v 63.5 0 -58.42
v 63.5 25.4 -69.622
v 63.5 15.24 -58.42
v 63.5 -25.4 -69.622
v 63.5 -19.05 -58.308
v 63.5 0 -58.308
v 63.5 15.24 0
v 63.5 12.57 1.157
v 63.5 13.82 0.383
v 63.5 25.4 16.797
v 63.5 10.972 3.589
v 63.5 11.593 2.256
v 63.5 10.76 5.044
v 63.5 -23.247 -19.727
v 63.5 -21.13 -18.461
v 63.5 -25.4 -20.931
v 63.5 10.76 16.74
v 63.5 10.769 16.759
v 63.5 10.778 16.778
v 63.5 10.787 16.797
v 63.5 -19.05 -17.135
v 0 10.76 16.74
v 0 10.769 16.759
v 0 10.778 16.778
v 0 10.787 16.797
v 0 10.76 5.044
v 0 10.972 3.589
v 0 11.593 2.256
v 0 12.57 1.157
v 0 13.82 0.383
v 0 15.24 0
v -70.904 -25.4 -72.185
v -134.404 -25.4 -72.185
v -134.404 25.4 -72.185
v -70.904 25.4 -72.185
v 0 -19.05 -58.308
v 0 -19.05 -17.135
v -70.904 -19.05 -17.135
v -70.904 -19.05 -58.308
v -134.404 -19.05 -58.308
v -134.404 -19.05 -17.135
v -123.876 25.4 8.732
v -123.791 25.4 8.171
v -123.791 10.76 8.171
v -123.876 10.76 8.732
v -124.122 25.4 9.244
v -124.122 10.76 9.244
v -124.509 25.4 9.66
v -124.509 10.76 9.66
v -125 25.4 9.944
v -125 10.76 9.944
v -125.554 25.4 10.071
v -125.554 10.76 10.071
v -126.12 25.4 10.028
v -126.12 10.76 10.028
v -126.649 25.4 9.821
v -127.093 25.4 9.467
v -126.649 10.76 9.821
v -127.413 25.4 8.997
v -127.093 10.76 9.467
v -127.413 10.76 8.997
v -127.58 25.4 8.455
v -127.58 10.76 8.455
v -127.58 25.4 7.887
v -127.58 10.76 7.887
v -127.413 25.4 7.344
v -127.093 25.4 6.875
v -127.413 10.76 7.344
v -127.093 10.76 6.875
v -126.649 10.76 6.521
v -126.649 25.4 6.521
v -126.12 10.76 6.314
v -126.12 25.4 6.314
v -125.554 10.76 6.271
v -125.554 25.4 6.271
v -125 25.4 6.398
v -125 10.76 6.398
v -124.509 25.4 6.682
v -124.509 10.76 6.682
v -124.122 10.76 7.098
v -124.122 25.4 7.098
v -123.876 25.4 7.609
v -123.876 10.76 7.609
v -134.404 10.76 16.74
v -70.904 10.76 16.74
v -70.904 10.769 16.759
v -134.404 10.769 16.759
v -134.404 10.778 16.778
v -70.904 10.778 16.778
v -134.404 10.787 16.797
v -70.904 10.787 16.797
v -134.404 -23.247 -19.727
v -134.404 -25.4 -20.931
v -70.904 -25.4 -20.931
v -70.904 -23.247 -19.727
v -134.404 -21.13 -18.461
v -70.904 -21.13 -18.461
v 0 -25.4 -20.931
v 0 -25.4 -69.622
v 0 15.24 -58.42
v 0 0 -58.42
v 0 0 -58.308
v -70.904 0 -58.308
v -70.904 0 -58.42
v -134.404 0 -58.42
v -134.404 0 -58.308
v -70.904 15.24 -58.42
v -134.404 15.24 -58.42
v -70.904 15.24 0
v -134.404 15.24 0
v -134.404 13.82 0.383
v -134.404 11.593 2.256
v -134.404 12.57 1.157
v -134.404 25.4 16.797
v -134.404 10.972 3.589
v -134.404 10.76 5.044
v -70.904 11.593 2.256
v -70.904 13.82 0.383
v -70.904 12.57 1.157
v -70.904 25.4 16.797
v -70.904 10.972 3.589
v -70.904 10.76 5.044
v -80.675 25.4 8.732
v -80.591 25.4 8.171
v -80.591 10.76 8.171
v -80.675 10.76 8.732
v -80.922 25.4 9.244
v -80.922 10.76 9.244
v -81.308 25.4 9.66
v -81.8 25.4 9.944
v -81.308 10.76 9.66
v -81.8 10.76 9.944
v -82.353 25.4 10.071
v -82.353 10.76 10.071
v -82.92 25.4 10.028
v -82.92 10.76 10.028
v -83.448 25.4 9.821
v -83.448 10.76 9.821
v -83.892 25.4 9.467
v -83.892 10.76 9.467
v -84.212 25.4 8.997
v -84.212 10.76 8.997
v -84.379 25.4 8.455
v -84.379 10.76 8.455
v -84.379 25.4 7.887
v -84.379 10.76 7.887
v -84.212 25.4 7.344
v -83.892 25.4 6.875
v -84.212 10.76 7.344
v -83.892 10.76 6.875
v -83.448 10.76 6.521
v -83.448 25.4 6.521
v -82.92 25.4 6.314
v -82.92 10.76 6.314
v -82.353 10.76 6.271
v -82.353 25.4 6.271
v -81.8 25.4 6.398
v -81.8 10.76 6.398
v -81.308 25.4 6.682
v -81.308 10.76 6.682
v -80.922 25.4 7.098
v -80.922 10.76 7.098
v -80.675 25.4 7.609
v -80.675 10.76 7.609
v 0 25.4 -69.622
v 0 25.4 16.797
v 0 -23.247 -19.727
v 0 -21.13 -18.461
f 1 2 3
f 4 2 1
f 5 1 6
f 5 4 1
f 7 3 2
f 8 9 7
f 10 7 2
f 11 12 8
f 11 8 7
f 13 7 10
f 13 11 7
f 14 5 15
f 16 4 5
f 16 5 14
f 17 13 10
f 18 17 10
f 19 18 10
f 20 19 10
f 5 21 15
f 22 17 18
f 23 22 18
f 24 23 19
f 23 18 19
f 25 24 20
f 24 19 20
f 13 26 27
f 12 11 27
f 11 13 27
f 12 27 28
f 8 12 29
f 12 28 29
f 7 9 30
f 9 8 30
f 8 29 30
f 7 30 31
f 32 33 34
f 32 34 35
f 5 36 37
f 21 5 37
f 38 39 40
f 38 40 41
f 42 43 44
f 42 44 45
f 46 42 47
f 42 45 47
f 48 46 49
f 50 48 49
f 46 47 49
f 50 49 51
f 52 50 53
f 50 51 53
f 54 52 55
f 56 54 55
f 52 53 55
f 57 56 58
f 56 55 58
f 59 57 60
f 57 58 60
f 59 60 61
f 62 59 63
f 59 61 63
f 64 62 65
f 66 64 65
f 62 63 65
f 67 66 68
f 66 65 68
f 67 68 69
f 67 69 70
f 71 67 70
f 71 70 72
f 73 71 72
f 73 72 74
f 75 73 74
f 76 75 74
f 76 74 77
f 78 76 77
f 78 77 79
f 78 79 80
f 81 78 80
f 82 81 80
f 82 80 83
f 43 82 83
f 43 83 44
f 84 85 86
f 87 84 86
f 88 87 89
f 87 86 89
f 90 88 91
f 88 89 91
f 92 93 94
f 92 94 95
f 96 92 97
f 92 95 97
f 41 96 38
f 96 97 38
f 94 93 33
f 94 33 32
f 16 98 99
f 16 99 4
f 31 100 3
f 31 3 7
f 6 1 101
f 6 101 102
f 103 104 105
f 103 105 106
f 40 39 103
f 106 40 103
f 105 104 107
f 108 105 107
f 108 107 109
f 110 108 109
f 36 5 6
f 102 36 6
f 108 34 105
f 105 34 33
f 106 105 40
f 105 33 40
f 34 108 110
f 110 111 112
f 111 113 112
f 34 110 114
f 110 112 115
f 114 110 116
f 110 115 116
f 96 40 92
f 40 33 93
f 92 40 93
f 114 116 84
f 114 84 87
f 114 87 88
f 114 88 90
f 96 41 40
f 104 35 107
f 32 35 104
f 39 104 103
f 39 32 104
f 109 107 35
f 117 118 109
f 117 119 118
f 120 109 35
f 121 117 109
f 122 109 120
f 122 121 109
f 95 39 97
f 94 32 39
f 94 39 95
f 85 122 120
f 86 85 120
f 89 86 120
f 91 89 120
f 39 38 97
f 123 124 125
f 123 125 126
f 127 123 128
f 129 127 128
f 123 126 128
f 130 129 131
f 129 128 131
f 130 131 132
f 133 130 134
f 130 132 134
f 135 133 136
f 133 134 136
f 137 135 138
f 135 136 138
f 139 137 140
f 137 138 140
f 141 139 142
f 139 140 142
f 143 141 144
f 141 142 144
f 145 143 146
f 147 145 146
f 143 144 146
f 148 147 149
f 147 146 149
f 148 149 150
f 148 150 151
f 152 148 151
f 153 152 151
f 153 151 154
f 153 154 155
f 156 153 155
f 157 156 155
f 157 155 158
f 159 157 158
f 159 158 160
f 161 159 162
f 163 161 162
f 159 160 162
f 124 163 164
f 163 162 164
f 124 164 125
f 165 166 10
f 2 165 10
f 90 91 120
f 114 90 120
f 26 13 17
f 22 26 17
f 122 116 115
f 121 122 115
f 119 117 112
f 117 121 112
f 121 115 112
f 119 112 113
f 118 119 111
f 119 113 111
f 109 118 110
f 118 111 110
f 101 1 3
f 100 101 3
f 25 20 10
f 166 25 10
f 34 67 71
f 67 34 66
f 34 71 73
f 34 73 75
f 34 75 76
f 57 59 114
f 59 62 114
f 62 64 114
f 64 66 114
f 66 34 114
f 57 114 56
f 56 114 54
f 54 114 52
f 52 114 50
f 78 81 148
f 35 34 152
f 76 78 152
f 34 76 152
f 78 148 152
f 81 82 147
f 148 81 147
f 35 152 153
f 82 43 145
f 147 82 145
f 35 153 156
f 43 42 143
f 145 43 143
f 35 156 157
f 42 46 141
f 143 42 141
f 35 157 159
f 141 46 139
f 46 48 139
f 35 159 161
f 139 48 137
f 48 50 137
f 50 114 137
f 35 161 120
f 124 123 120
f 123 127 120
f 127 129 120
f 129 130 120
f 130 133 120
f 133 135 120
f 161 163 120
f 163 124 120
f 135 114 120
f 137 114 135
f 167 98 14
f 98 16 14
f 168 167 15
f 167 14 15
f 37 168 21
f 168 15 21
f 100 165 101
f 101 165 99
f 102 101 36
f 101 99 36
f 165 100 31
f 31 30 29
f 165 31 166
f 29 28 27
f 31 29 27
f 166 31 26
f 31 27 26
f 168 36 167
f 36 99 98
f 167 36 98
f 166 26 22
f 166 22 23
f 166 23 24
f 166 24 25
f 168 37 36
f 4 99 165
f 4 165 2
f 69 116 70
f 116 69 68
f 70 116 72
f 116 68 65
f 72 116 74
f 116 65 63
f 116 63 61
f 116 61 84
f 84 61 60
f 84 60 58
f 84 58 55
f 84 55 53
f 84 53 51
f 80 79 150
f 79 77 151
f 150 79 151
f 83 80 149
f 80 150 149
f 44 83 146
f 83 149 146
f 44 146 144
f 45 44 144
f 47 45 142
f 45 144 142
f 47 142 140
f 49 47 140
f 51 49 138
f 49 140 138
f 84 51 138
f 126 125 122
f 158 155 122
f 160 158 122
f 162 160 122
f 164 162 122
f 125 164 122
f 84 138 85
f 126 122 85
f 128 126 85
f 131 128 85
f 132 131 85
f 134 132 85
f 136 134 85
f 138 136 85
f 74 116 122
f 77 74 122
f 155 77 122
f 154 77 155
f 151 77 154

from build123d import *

# Parameters (mm, degrees)
F0_W           = 63.5
F0_H           = 203.2
F1_DEPTH       = 25.4
F2_R           = 5.08
F2_2_R         = 5.08
F3_R           = 85.5041731658
F4_DEPTH       = 152.4
F5_W           = 19.05
F5_H           = 58.3084138111
F6_DEPTH       = 190.5
F7_W           = 15.24
F7_H           = 58.42
F8_DEPTH       = 190.5
F9_R           = 5.08
F9_2_R         = 5.08
F10_W          = 137.1934004128
F10_H          = 115.8126294613
F11_DEPTH      = 635
F12_W          = 13.0418678746
F12_H          = 28.3660627902
F13_DEPTH      = 254
F14_W          = 37.495367229
F14_H          = 80.2074819803
F15_DEPTH      = 254
F16_R          = 1.905
F17_DEPTH      = 127
F18_T1_DEPTH   = 88.7224853994
F18_2_T1_DEPTH = 88.7224853994


# Not quite as in the source:
# - a fillet or chamfer that OpenCascade refuses, or shapes differently, is made with other operations: its cross-section is extruded or revolved along the edge and cut away or added


with BuildPart() as f1:
    # F0 (on Front) → F1 (new body, symmetric)
    with BuildSketch(Plane.XZ):
        with Locations((-102.6535956171, 29.415011573)):
            Rectangle(F0_W, F0_H)
    extrude(amount=F1_DEPTH, both=True)

    # F2
    f2_edges = [f1.edges().sort_by_distance(p)[0] for p in [
        (-102.653596, -25.4, 131.015012),
    ]]
    fillet(f2_edges, radius=F2_R)


with BuildPart() as f1b:
    # F0 (on Front) → F1, piece 2 (new body, symmetric)
    with BuildSketch(Plane.XZ):
        with Locations((31.75, 31.9777971928)):
            Rectangle(F0_W, F0_H)
    extrude(amount=F1_DEPTH, both=True)

    # F2#2
    f2_2_edges = [f1b.edges().sort_by_distance(p)[0] for p in [
        (31.75, -25.4, 133.577797),
    ]]
    fillet(f2_2_edges, radius=F2_2_R)


with BuildPart() as f4_tool:
    # F3 (on Right) → F4 (new body, symmetric)
    with BuildSketch(Plane.YZ):
        with Locations((-66.0597089804, 54.2870010056)):
            Circle(F3_R)
    extrude(amount=F4_DEPTH, both=True)


with BuildPart() as f1_1:
    add(f1.part)

    # F4: cut by f4_tool
    add(f4_tool.part, mode=Mode.SUBTRACT)


with BuildPart() as f1b_1:
    add(f1b.part)

    # F4: cut by f4_tool
    add(f4_tool.part, mode=Mode.SUBTRACT)


with BuildPart() as f6_tool:
    # F5 (on Right) → F6 (new body, symmetric)
    with BuildSketch(Plane.YZ):
        with Locations((-9.525, -29.1542069055)):
            Rectangle(F5_W, F5_H)
    extrude(amount=F6_DEPTH, both=True)


with BuildPart() as f1_2:
    add(f1_1.part)

    # F6: cut by f6_tool
    add(f6_tool.part, mode=Mode.SUBTRACT)


with BuildPart() as f1b_2:
    add(f1b_1.part)

    # F6: cut by f6_tool
    add(f6_tool.part, mode=Mode.SUBTRACT)


with BuildPart() as f8_tool:
    # F7 (on Right) → F8 (new body, symmetric)
    with BuildSketch(Plane.YZ):
        with Locations((7.62, -29.21)):
            Rectangle(F7_W, F7_H)
    extrude(amount=F8_DEPTH, both=True)


with BuildPart() as f1_3:
    add(f1_2.part)

    # F8: cut by f8_tool
    add(f8_tool.part, mode=Mode.SUBTRACT)

    # F9
    f9_edges = [f1_3.edges().sort_by_distance(p)[0] for p in [
        (-102.653596, 0, 0),
    ]]
    fillet(f9_edges, radius=F9_R)


with BuildPart() as f1b_3:
    add(f1b_2.part)

    # F8: cut by f8_tool
    add(f8_tool.part, mode=Mode.SUBTRACT)

    # F9#2
    f9_2_edges = [f1b_3.edges().sort_by_distance(p)[0] for p in [
        (31.75, 0, 0),
    ]]
    fillet(f9_2_edges, radius=F9_2_R)


with BuildPart() as f11_tool:
    # F10 (on Right) → F11 (new body, symmetric)
    with BuildSketch(Plane.YZ):
        with Locations((25.8351210505, 135.2587789297)):
            Rectangle(F10_W, F10_H)
    extrude(amount=F11_DEPTH, both=True)


with BuildPart() as f1_4:
    add(f1_3.part)

    # F11: cut by f11_tool
    add(f11_tool.part, mode=Mode.SUBTRACT)


with BuildPart() as f1b_4:
    add(f1b_3.part)

    # F11: cut by f11_tool
    add(f11_tool.part, mode=Mode.SUBTRACT)


with BuildPart() as f13_tool:
    # F12 (on Right) → F13 (new body, symmetric)
    with BuildSketch(Plane.YZ):
        with Locations((4.2386068963, 4.7333268449)):
            Rectangle(F12_W, F12_H)
    extrude(amount=F13_DEPTH, both=True)


with BuildPart() as f1_5:
    add(f1_4.part)

    # F13: cut by f13_tool
    add(f13_tool.part, mode=Mode.SUBTRACT)


with BuildPart() as f1b_5:
    add(f1b_4.part)

    # F13: cut by f13_tool
    add(f13_tool.part, mode=Mode.SUBTRACT)


with BuildPart() as f15_tool:
    # F14 (on Right) → F15 (new body, symmetric)
    with BuildSketch(Plane.YZ):
        with Locations((22.6602442563, 56.9007955492)):
            Rectangle(F14_W, F14_H)
    extrude(amount=F15_DEPTH, both=True)


with BuildPart() as f1_6:
    add(f1_5.part)

    # F15: cut by f15_tool
    add(f15_tool.part, mode=Mode.SUBTRACT)

    # F16 (on Front) → F17 (cut, symmetric)
    with BuildSketch(Plane.XZ):
        with Locations((-125.6962865591, 8.1708896905)):
            Circle(F16_R)
        with Locations((-82.4957340956, 8.1708896905)):
            Circle(F16_R)
    extrude(amount=F17_DEPTH, both=True, mode=Mode.SUBTRACT)

    # F18: fillet of radius 5.08 on 1 edges, made by hand

    # F18_s2 → F18_t1 (cut)
    with BuildSketch(Plane.YZ.offset(-147.0148383168)):
        with BuildLine():
            ThreePointArc((10.7595408335, 5.0444970799), (12.0413789469, 1.6710172322), (15.24, 0))
            Line((15.24, 0), (10.7595408335, 0))
            Line((10.7595408335, 0), (10.7595408335, 5.0444970799))
        make_face()
    extrude(amount=F18_T1_DEPTH, mode=Mode.SUBTRACT)


with BuildPart() as f1b_6:
    add(f1b_5.part)

    # F15: cut by f15_tool
    add(f15_tool.part, mode=Mode.SUBTRACT)

    # F18#2: fillet of radius 5.08 on 1 edges, made by hand

    # F18_2_s2 → F18_2_t1 (cut)
    with BuildSketch(Plane.YZ.offset(-12.6112426997)):
        with BuildLine():
            ThreePointArc((10.7595408335, 5.0444970799), (12.0413789469, 1.6710172322), (15.24, 0))
            Line((15.24, 0), (10.7595408335, 0))
            Line((10.7595408335, 0), (10.7595408335, 5.0444970799))
        make_face()
    extrude(amount=F18_2_T1_DEPTH, mode=Mode.SUBTRACT)


solid = Compound([f1_6.part, f1b_6.part])
